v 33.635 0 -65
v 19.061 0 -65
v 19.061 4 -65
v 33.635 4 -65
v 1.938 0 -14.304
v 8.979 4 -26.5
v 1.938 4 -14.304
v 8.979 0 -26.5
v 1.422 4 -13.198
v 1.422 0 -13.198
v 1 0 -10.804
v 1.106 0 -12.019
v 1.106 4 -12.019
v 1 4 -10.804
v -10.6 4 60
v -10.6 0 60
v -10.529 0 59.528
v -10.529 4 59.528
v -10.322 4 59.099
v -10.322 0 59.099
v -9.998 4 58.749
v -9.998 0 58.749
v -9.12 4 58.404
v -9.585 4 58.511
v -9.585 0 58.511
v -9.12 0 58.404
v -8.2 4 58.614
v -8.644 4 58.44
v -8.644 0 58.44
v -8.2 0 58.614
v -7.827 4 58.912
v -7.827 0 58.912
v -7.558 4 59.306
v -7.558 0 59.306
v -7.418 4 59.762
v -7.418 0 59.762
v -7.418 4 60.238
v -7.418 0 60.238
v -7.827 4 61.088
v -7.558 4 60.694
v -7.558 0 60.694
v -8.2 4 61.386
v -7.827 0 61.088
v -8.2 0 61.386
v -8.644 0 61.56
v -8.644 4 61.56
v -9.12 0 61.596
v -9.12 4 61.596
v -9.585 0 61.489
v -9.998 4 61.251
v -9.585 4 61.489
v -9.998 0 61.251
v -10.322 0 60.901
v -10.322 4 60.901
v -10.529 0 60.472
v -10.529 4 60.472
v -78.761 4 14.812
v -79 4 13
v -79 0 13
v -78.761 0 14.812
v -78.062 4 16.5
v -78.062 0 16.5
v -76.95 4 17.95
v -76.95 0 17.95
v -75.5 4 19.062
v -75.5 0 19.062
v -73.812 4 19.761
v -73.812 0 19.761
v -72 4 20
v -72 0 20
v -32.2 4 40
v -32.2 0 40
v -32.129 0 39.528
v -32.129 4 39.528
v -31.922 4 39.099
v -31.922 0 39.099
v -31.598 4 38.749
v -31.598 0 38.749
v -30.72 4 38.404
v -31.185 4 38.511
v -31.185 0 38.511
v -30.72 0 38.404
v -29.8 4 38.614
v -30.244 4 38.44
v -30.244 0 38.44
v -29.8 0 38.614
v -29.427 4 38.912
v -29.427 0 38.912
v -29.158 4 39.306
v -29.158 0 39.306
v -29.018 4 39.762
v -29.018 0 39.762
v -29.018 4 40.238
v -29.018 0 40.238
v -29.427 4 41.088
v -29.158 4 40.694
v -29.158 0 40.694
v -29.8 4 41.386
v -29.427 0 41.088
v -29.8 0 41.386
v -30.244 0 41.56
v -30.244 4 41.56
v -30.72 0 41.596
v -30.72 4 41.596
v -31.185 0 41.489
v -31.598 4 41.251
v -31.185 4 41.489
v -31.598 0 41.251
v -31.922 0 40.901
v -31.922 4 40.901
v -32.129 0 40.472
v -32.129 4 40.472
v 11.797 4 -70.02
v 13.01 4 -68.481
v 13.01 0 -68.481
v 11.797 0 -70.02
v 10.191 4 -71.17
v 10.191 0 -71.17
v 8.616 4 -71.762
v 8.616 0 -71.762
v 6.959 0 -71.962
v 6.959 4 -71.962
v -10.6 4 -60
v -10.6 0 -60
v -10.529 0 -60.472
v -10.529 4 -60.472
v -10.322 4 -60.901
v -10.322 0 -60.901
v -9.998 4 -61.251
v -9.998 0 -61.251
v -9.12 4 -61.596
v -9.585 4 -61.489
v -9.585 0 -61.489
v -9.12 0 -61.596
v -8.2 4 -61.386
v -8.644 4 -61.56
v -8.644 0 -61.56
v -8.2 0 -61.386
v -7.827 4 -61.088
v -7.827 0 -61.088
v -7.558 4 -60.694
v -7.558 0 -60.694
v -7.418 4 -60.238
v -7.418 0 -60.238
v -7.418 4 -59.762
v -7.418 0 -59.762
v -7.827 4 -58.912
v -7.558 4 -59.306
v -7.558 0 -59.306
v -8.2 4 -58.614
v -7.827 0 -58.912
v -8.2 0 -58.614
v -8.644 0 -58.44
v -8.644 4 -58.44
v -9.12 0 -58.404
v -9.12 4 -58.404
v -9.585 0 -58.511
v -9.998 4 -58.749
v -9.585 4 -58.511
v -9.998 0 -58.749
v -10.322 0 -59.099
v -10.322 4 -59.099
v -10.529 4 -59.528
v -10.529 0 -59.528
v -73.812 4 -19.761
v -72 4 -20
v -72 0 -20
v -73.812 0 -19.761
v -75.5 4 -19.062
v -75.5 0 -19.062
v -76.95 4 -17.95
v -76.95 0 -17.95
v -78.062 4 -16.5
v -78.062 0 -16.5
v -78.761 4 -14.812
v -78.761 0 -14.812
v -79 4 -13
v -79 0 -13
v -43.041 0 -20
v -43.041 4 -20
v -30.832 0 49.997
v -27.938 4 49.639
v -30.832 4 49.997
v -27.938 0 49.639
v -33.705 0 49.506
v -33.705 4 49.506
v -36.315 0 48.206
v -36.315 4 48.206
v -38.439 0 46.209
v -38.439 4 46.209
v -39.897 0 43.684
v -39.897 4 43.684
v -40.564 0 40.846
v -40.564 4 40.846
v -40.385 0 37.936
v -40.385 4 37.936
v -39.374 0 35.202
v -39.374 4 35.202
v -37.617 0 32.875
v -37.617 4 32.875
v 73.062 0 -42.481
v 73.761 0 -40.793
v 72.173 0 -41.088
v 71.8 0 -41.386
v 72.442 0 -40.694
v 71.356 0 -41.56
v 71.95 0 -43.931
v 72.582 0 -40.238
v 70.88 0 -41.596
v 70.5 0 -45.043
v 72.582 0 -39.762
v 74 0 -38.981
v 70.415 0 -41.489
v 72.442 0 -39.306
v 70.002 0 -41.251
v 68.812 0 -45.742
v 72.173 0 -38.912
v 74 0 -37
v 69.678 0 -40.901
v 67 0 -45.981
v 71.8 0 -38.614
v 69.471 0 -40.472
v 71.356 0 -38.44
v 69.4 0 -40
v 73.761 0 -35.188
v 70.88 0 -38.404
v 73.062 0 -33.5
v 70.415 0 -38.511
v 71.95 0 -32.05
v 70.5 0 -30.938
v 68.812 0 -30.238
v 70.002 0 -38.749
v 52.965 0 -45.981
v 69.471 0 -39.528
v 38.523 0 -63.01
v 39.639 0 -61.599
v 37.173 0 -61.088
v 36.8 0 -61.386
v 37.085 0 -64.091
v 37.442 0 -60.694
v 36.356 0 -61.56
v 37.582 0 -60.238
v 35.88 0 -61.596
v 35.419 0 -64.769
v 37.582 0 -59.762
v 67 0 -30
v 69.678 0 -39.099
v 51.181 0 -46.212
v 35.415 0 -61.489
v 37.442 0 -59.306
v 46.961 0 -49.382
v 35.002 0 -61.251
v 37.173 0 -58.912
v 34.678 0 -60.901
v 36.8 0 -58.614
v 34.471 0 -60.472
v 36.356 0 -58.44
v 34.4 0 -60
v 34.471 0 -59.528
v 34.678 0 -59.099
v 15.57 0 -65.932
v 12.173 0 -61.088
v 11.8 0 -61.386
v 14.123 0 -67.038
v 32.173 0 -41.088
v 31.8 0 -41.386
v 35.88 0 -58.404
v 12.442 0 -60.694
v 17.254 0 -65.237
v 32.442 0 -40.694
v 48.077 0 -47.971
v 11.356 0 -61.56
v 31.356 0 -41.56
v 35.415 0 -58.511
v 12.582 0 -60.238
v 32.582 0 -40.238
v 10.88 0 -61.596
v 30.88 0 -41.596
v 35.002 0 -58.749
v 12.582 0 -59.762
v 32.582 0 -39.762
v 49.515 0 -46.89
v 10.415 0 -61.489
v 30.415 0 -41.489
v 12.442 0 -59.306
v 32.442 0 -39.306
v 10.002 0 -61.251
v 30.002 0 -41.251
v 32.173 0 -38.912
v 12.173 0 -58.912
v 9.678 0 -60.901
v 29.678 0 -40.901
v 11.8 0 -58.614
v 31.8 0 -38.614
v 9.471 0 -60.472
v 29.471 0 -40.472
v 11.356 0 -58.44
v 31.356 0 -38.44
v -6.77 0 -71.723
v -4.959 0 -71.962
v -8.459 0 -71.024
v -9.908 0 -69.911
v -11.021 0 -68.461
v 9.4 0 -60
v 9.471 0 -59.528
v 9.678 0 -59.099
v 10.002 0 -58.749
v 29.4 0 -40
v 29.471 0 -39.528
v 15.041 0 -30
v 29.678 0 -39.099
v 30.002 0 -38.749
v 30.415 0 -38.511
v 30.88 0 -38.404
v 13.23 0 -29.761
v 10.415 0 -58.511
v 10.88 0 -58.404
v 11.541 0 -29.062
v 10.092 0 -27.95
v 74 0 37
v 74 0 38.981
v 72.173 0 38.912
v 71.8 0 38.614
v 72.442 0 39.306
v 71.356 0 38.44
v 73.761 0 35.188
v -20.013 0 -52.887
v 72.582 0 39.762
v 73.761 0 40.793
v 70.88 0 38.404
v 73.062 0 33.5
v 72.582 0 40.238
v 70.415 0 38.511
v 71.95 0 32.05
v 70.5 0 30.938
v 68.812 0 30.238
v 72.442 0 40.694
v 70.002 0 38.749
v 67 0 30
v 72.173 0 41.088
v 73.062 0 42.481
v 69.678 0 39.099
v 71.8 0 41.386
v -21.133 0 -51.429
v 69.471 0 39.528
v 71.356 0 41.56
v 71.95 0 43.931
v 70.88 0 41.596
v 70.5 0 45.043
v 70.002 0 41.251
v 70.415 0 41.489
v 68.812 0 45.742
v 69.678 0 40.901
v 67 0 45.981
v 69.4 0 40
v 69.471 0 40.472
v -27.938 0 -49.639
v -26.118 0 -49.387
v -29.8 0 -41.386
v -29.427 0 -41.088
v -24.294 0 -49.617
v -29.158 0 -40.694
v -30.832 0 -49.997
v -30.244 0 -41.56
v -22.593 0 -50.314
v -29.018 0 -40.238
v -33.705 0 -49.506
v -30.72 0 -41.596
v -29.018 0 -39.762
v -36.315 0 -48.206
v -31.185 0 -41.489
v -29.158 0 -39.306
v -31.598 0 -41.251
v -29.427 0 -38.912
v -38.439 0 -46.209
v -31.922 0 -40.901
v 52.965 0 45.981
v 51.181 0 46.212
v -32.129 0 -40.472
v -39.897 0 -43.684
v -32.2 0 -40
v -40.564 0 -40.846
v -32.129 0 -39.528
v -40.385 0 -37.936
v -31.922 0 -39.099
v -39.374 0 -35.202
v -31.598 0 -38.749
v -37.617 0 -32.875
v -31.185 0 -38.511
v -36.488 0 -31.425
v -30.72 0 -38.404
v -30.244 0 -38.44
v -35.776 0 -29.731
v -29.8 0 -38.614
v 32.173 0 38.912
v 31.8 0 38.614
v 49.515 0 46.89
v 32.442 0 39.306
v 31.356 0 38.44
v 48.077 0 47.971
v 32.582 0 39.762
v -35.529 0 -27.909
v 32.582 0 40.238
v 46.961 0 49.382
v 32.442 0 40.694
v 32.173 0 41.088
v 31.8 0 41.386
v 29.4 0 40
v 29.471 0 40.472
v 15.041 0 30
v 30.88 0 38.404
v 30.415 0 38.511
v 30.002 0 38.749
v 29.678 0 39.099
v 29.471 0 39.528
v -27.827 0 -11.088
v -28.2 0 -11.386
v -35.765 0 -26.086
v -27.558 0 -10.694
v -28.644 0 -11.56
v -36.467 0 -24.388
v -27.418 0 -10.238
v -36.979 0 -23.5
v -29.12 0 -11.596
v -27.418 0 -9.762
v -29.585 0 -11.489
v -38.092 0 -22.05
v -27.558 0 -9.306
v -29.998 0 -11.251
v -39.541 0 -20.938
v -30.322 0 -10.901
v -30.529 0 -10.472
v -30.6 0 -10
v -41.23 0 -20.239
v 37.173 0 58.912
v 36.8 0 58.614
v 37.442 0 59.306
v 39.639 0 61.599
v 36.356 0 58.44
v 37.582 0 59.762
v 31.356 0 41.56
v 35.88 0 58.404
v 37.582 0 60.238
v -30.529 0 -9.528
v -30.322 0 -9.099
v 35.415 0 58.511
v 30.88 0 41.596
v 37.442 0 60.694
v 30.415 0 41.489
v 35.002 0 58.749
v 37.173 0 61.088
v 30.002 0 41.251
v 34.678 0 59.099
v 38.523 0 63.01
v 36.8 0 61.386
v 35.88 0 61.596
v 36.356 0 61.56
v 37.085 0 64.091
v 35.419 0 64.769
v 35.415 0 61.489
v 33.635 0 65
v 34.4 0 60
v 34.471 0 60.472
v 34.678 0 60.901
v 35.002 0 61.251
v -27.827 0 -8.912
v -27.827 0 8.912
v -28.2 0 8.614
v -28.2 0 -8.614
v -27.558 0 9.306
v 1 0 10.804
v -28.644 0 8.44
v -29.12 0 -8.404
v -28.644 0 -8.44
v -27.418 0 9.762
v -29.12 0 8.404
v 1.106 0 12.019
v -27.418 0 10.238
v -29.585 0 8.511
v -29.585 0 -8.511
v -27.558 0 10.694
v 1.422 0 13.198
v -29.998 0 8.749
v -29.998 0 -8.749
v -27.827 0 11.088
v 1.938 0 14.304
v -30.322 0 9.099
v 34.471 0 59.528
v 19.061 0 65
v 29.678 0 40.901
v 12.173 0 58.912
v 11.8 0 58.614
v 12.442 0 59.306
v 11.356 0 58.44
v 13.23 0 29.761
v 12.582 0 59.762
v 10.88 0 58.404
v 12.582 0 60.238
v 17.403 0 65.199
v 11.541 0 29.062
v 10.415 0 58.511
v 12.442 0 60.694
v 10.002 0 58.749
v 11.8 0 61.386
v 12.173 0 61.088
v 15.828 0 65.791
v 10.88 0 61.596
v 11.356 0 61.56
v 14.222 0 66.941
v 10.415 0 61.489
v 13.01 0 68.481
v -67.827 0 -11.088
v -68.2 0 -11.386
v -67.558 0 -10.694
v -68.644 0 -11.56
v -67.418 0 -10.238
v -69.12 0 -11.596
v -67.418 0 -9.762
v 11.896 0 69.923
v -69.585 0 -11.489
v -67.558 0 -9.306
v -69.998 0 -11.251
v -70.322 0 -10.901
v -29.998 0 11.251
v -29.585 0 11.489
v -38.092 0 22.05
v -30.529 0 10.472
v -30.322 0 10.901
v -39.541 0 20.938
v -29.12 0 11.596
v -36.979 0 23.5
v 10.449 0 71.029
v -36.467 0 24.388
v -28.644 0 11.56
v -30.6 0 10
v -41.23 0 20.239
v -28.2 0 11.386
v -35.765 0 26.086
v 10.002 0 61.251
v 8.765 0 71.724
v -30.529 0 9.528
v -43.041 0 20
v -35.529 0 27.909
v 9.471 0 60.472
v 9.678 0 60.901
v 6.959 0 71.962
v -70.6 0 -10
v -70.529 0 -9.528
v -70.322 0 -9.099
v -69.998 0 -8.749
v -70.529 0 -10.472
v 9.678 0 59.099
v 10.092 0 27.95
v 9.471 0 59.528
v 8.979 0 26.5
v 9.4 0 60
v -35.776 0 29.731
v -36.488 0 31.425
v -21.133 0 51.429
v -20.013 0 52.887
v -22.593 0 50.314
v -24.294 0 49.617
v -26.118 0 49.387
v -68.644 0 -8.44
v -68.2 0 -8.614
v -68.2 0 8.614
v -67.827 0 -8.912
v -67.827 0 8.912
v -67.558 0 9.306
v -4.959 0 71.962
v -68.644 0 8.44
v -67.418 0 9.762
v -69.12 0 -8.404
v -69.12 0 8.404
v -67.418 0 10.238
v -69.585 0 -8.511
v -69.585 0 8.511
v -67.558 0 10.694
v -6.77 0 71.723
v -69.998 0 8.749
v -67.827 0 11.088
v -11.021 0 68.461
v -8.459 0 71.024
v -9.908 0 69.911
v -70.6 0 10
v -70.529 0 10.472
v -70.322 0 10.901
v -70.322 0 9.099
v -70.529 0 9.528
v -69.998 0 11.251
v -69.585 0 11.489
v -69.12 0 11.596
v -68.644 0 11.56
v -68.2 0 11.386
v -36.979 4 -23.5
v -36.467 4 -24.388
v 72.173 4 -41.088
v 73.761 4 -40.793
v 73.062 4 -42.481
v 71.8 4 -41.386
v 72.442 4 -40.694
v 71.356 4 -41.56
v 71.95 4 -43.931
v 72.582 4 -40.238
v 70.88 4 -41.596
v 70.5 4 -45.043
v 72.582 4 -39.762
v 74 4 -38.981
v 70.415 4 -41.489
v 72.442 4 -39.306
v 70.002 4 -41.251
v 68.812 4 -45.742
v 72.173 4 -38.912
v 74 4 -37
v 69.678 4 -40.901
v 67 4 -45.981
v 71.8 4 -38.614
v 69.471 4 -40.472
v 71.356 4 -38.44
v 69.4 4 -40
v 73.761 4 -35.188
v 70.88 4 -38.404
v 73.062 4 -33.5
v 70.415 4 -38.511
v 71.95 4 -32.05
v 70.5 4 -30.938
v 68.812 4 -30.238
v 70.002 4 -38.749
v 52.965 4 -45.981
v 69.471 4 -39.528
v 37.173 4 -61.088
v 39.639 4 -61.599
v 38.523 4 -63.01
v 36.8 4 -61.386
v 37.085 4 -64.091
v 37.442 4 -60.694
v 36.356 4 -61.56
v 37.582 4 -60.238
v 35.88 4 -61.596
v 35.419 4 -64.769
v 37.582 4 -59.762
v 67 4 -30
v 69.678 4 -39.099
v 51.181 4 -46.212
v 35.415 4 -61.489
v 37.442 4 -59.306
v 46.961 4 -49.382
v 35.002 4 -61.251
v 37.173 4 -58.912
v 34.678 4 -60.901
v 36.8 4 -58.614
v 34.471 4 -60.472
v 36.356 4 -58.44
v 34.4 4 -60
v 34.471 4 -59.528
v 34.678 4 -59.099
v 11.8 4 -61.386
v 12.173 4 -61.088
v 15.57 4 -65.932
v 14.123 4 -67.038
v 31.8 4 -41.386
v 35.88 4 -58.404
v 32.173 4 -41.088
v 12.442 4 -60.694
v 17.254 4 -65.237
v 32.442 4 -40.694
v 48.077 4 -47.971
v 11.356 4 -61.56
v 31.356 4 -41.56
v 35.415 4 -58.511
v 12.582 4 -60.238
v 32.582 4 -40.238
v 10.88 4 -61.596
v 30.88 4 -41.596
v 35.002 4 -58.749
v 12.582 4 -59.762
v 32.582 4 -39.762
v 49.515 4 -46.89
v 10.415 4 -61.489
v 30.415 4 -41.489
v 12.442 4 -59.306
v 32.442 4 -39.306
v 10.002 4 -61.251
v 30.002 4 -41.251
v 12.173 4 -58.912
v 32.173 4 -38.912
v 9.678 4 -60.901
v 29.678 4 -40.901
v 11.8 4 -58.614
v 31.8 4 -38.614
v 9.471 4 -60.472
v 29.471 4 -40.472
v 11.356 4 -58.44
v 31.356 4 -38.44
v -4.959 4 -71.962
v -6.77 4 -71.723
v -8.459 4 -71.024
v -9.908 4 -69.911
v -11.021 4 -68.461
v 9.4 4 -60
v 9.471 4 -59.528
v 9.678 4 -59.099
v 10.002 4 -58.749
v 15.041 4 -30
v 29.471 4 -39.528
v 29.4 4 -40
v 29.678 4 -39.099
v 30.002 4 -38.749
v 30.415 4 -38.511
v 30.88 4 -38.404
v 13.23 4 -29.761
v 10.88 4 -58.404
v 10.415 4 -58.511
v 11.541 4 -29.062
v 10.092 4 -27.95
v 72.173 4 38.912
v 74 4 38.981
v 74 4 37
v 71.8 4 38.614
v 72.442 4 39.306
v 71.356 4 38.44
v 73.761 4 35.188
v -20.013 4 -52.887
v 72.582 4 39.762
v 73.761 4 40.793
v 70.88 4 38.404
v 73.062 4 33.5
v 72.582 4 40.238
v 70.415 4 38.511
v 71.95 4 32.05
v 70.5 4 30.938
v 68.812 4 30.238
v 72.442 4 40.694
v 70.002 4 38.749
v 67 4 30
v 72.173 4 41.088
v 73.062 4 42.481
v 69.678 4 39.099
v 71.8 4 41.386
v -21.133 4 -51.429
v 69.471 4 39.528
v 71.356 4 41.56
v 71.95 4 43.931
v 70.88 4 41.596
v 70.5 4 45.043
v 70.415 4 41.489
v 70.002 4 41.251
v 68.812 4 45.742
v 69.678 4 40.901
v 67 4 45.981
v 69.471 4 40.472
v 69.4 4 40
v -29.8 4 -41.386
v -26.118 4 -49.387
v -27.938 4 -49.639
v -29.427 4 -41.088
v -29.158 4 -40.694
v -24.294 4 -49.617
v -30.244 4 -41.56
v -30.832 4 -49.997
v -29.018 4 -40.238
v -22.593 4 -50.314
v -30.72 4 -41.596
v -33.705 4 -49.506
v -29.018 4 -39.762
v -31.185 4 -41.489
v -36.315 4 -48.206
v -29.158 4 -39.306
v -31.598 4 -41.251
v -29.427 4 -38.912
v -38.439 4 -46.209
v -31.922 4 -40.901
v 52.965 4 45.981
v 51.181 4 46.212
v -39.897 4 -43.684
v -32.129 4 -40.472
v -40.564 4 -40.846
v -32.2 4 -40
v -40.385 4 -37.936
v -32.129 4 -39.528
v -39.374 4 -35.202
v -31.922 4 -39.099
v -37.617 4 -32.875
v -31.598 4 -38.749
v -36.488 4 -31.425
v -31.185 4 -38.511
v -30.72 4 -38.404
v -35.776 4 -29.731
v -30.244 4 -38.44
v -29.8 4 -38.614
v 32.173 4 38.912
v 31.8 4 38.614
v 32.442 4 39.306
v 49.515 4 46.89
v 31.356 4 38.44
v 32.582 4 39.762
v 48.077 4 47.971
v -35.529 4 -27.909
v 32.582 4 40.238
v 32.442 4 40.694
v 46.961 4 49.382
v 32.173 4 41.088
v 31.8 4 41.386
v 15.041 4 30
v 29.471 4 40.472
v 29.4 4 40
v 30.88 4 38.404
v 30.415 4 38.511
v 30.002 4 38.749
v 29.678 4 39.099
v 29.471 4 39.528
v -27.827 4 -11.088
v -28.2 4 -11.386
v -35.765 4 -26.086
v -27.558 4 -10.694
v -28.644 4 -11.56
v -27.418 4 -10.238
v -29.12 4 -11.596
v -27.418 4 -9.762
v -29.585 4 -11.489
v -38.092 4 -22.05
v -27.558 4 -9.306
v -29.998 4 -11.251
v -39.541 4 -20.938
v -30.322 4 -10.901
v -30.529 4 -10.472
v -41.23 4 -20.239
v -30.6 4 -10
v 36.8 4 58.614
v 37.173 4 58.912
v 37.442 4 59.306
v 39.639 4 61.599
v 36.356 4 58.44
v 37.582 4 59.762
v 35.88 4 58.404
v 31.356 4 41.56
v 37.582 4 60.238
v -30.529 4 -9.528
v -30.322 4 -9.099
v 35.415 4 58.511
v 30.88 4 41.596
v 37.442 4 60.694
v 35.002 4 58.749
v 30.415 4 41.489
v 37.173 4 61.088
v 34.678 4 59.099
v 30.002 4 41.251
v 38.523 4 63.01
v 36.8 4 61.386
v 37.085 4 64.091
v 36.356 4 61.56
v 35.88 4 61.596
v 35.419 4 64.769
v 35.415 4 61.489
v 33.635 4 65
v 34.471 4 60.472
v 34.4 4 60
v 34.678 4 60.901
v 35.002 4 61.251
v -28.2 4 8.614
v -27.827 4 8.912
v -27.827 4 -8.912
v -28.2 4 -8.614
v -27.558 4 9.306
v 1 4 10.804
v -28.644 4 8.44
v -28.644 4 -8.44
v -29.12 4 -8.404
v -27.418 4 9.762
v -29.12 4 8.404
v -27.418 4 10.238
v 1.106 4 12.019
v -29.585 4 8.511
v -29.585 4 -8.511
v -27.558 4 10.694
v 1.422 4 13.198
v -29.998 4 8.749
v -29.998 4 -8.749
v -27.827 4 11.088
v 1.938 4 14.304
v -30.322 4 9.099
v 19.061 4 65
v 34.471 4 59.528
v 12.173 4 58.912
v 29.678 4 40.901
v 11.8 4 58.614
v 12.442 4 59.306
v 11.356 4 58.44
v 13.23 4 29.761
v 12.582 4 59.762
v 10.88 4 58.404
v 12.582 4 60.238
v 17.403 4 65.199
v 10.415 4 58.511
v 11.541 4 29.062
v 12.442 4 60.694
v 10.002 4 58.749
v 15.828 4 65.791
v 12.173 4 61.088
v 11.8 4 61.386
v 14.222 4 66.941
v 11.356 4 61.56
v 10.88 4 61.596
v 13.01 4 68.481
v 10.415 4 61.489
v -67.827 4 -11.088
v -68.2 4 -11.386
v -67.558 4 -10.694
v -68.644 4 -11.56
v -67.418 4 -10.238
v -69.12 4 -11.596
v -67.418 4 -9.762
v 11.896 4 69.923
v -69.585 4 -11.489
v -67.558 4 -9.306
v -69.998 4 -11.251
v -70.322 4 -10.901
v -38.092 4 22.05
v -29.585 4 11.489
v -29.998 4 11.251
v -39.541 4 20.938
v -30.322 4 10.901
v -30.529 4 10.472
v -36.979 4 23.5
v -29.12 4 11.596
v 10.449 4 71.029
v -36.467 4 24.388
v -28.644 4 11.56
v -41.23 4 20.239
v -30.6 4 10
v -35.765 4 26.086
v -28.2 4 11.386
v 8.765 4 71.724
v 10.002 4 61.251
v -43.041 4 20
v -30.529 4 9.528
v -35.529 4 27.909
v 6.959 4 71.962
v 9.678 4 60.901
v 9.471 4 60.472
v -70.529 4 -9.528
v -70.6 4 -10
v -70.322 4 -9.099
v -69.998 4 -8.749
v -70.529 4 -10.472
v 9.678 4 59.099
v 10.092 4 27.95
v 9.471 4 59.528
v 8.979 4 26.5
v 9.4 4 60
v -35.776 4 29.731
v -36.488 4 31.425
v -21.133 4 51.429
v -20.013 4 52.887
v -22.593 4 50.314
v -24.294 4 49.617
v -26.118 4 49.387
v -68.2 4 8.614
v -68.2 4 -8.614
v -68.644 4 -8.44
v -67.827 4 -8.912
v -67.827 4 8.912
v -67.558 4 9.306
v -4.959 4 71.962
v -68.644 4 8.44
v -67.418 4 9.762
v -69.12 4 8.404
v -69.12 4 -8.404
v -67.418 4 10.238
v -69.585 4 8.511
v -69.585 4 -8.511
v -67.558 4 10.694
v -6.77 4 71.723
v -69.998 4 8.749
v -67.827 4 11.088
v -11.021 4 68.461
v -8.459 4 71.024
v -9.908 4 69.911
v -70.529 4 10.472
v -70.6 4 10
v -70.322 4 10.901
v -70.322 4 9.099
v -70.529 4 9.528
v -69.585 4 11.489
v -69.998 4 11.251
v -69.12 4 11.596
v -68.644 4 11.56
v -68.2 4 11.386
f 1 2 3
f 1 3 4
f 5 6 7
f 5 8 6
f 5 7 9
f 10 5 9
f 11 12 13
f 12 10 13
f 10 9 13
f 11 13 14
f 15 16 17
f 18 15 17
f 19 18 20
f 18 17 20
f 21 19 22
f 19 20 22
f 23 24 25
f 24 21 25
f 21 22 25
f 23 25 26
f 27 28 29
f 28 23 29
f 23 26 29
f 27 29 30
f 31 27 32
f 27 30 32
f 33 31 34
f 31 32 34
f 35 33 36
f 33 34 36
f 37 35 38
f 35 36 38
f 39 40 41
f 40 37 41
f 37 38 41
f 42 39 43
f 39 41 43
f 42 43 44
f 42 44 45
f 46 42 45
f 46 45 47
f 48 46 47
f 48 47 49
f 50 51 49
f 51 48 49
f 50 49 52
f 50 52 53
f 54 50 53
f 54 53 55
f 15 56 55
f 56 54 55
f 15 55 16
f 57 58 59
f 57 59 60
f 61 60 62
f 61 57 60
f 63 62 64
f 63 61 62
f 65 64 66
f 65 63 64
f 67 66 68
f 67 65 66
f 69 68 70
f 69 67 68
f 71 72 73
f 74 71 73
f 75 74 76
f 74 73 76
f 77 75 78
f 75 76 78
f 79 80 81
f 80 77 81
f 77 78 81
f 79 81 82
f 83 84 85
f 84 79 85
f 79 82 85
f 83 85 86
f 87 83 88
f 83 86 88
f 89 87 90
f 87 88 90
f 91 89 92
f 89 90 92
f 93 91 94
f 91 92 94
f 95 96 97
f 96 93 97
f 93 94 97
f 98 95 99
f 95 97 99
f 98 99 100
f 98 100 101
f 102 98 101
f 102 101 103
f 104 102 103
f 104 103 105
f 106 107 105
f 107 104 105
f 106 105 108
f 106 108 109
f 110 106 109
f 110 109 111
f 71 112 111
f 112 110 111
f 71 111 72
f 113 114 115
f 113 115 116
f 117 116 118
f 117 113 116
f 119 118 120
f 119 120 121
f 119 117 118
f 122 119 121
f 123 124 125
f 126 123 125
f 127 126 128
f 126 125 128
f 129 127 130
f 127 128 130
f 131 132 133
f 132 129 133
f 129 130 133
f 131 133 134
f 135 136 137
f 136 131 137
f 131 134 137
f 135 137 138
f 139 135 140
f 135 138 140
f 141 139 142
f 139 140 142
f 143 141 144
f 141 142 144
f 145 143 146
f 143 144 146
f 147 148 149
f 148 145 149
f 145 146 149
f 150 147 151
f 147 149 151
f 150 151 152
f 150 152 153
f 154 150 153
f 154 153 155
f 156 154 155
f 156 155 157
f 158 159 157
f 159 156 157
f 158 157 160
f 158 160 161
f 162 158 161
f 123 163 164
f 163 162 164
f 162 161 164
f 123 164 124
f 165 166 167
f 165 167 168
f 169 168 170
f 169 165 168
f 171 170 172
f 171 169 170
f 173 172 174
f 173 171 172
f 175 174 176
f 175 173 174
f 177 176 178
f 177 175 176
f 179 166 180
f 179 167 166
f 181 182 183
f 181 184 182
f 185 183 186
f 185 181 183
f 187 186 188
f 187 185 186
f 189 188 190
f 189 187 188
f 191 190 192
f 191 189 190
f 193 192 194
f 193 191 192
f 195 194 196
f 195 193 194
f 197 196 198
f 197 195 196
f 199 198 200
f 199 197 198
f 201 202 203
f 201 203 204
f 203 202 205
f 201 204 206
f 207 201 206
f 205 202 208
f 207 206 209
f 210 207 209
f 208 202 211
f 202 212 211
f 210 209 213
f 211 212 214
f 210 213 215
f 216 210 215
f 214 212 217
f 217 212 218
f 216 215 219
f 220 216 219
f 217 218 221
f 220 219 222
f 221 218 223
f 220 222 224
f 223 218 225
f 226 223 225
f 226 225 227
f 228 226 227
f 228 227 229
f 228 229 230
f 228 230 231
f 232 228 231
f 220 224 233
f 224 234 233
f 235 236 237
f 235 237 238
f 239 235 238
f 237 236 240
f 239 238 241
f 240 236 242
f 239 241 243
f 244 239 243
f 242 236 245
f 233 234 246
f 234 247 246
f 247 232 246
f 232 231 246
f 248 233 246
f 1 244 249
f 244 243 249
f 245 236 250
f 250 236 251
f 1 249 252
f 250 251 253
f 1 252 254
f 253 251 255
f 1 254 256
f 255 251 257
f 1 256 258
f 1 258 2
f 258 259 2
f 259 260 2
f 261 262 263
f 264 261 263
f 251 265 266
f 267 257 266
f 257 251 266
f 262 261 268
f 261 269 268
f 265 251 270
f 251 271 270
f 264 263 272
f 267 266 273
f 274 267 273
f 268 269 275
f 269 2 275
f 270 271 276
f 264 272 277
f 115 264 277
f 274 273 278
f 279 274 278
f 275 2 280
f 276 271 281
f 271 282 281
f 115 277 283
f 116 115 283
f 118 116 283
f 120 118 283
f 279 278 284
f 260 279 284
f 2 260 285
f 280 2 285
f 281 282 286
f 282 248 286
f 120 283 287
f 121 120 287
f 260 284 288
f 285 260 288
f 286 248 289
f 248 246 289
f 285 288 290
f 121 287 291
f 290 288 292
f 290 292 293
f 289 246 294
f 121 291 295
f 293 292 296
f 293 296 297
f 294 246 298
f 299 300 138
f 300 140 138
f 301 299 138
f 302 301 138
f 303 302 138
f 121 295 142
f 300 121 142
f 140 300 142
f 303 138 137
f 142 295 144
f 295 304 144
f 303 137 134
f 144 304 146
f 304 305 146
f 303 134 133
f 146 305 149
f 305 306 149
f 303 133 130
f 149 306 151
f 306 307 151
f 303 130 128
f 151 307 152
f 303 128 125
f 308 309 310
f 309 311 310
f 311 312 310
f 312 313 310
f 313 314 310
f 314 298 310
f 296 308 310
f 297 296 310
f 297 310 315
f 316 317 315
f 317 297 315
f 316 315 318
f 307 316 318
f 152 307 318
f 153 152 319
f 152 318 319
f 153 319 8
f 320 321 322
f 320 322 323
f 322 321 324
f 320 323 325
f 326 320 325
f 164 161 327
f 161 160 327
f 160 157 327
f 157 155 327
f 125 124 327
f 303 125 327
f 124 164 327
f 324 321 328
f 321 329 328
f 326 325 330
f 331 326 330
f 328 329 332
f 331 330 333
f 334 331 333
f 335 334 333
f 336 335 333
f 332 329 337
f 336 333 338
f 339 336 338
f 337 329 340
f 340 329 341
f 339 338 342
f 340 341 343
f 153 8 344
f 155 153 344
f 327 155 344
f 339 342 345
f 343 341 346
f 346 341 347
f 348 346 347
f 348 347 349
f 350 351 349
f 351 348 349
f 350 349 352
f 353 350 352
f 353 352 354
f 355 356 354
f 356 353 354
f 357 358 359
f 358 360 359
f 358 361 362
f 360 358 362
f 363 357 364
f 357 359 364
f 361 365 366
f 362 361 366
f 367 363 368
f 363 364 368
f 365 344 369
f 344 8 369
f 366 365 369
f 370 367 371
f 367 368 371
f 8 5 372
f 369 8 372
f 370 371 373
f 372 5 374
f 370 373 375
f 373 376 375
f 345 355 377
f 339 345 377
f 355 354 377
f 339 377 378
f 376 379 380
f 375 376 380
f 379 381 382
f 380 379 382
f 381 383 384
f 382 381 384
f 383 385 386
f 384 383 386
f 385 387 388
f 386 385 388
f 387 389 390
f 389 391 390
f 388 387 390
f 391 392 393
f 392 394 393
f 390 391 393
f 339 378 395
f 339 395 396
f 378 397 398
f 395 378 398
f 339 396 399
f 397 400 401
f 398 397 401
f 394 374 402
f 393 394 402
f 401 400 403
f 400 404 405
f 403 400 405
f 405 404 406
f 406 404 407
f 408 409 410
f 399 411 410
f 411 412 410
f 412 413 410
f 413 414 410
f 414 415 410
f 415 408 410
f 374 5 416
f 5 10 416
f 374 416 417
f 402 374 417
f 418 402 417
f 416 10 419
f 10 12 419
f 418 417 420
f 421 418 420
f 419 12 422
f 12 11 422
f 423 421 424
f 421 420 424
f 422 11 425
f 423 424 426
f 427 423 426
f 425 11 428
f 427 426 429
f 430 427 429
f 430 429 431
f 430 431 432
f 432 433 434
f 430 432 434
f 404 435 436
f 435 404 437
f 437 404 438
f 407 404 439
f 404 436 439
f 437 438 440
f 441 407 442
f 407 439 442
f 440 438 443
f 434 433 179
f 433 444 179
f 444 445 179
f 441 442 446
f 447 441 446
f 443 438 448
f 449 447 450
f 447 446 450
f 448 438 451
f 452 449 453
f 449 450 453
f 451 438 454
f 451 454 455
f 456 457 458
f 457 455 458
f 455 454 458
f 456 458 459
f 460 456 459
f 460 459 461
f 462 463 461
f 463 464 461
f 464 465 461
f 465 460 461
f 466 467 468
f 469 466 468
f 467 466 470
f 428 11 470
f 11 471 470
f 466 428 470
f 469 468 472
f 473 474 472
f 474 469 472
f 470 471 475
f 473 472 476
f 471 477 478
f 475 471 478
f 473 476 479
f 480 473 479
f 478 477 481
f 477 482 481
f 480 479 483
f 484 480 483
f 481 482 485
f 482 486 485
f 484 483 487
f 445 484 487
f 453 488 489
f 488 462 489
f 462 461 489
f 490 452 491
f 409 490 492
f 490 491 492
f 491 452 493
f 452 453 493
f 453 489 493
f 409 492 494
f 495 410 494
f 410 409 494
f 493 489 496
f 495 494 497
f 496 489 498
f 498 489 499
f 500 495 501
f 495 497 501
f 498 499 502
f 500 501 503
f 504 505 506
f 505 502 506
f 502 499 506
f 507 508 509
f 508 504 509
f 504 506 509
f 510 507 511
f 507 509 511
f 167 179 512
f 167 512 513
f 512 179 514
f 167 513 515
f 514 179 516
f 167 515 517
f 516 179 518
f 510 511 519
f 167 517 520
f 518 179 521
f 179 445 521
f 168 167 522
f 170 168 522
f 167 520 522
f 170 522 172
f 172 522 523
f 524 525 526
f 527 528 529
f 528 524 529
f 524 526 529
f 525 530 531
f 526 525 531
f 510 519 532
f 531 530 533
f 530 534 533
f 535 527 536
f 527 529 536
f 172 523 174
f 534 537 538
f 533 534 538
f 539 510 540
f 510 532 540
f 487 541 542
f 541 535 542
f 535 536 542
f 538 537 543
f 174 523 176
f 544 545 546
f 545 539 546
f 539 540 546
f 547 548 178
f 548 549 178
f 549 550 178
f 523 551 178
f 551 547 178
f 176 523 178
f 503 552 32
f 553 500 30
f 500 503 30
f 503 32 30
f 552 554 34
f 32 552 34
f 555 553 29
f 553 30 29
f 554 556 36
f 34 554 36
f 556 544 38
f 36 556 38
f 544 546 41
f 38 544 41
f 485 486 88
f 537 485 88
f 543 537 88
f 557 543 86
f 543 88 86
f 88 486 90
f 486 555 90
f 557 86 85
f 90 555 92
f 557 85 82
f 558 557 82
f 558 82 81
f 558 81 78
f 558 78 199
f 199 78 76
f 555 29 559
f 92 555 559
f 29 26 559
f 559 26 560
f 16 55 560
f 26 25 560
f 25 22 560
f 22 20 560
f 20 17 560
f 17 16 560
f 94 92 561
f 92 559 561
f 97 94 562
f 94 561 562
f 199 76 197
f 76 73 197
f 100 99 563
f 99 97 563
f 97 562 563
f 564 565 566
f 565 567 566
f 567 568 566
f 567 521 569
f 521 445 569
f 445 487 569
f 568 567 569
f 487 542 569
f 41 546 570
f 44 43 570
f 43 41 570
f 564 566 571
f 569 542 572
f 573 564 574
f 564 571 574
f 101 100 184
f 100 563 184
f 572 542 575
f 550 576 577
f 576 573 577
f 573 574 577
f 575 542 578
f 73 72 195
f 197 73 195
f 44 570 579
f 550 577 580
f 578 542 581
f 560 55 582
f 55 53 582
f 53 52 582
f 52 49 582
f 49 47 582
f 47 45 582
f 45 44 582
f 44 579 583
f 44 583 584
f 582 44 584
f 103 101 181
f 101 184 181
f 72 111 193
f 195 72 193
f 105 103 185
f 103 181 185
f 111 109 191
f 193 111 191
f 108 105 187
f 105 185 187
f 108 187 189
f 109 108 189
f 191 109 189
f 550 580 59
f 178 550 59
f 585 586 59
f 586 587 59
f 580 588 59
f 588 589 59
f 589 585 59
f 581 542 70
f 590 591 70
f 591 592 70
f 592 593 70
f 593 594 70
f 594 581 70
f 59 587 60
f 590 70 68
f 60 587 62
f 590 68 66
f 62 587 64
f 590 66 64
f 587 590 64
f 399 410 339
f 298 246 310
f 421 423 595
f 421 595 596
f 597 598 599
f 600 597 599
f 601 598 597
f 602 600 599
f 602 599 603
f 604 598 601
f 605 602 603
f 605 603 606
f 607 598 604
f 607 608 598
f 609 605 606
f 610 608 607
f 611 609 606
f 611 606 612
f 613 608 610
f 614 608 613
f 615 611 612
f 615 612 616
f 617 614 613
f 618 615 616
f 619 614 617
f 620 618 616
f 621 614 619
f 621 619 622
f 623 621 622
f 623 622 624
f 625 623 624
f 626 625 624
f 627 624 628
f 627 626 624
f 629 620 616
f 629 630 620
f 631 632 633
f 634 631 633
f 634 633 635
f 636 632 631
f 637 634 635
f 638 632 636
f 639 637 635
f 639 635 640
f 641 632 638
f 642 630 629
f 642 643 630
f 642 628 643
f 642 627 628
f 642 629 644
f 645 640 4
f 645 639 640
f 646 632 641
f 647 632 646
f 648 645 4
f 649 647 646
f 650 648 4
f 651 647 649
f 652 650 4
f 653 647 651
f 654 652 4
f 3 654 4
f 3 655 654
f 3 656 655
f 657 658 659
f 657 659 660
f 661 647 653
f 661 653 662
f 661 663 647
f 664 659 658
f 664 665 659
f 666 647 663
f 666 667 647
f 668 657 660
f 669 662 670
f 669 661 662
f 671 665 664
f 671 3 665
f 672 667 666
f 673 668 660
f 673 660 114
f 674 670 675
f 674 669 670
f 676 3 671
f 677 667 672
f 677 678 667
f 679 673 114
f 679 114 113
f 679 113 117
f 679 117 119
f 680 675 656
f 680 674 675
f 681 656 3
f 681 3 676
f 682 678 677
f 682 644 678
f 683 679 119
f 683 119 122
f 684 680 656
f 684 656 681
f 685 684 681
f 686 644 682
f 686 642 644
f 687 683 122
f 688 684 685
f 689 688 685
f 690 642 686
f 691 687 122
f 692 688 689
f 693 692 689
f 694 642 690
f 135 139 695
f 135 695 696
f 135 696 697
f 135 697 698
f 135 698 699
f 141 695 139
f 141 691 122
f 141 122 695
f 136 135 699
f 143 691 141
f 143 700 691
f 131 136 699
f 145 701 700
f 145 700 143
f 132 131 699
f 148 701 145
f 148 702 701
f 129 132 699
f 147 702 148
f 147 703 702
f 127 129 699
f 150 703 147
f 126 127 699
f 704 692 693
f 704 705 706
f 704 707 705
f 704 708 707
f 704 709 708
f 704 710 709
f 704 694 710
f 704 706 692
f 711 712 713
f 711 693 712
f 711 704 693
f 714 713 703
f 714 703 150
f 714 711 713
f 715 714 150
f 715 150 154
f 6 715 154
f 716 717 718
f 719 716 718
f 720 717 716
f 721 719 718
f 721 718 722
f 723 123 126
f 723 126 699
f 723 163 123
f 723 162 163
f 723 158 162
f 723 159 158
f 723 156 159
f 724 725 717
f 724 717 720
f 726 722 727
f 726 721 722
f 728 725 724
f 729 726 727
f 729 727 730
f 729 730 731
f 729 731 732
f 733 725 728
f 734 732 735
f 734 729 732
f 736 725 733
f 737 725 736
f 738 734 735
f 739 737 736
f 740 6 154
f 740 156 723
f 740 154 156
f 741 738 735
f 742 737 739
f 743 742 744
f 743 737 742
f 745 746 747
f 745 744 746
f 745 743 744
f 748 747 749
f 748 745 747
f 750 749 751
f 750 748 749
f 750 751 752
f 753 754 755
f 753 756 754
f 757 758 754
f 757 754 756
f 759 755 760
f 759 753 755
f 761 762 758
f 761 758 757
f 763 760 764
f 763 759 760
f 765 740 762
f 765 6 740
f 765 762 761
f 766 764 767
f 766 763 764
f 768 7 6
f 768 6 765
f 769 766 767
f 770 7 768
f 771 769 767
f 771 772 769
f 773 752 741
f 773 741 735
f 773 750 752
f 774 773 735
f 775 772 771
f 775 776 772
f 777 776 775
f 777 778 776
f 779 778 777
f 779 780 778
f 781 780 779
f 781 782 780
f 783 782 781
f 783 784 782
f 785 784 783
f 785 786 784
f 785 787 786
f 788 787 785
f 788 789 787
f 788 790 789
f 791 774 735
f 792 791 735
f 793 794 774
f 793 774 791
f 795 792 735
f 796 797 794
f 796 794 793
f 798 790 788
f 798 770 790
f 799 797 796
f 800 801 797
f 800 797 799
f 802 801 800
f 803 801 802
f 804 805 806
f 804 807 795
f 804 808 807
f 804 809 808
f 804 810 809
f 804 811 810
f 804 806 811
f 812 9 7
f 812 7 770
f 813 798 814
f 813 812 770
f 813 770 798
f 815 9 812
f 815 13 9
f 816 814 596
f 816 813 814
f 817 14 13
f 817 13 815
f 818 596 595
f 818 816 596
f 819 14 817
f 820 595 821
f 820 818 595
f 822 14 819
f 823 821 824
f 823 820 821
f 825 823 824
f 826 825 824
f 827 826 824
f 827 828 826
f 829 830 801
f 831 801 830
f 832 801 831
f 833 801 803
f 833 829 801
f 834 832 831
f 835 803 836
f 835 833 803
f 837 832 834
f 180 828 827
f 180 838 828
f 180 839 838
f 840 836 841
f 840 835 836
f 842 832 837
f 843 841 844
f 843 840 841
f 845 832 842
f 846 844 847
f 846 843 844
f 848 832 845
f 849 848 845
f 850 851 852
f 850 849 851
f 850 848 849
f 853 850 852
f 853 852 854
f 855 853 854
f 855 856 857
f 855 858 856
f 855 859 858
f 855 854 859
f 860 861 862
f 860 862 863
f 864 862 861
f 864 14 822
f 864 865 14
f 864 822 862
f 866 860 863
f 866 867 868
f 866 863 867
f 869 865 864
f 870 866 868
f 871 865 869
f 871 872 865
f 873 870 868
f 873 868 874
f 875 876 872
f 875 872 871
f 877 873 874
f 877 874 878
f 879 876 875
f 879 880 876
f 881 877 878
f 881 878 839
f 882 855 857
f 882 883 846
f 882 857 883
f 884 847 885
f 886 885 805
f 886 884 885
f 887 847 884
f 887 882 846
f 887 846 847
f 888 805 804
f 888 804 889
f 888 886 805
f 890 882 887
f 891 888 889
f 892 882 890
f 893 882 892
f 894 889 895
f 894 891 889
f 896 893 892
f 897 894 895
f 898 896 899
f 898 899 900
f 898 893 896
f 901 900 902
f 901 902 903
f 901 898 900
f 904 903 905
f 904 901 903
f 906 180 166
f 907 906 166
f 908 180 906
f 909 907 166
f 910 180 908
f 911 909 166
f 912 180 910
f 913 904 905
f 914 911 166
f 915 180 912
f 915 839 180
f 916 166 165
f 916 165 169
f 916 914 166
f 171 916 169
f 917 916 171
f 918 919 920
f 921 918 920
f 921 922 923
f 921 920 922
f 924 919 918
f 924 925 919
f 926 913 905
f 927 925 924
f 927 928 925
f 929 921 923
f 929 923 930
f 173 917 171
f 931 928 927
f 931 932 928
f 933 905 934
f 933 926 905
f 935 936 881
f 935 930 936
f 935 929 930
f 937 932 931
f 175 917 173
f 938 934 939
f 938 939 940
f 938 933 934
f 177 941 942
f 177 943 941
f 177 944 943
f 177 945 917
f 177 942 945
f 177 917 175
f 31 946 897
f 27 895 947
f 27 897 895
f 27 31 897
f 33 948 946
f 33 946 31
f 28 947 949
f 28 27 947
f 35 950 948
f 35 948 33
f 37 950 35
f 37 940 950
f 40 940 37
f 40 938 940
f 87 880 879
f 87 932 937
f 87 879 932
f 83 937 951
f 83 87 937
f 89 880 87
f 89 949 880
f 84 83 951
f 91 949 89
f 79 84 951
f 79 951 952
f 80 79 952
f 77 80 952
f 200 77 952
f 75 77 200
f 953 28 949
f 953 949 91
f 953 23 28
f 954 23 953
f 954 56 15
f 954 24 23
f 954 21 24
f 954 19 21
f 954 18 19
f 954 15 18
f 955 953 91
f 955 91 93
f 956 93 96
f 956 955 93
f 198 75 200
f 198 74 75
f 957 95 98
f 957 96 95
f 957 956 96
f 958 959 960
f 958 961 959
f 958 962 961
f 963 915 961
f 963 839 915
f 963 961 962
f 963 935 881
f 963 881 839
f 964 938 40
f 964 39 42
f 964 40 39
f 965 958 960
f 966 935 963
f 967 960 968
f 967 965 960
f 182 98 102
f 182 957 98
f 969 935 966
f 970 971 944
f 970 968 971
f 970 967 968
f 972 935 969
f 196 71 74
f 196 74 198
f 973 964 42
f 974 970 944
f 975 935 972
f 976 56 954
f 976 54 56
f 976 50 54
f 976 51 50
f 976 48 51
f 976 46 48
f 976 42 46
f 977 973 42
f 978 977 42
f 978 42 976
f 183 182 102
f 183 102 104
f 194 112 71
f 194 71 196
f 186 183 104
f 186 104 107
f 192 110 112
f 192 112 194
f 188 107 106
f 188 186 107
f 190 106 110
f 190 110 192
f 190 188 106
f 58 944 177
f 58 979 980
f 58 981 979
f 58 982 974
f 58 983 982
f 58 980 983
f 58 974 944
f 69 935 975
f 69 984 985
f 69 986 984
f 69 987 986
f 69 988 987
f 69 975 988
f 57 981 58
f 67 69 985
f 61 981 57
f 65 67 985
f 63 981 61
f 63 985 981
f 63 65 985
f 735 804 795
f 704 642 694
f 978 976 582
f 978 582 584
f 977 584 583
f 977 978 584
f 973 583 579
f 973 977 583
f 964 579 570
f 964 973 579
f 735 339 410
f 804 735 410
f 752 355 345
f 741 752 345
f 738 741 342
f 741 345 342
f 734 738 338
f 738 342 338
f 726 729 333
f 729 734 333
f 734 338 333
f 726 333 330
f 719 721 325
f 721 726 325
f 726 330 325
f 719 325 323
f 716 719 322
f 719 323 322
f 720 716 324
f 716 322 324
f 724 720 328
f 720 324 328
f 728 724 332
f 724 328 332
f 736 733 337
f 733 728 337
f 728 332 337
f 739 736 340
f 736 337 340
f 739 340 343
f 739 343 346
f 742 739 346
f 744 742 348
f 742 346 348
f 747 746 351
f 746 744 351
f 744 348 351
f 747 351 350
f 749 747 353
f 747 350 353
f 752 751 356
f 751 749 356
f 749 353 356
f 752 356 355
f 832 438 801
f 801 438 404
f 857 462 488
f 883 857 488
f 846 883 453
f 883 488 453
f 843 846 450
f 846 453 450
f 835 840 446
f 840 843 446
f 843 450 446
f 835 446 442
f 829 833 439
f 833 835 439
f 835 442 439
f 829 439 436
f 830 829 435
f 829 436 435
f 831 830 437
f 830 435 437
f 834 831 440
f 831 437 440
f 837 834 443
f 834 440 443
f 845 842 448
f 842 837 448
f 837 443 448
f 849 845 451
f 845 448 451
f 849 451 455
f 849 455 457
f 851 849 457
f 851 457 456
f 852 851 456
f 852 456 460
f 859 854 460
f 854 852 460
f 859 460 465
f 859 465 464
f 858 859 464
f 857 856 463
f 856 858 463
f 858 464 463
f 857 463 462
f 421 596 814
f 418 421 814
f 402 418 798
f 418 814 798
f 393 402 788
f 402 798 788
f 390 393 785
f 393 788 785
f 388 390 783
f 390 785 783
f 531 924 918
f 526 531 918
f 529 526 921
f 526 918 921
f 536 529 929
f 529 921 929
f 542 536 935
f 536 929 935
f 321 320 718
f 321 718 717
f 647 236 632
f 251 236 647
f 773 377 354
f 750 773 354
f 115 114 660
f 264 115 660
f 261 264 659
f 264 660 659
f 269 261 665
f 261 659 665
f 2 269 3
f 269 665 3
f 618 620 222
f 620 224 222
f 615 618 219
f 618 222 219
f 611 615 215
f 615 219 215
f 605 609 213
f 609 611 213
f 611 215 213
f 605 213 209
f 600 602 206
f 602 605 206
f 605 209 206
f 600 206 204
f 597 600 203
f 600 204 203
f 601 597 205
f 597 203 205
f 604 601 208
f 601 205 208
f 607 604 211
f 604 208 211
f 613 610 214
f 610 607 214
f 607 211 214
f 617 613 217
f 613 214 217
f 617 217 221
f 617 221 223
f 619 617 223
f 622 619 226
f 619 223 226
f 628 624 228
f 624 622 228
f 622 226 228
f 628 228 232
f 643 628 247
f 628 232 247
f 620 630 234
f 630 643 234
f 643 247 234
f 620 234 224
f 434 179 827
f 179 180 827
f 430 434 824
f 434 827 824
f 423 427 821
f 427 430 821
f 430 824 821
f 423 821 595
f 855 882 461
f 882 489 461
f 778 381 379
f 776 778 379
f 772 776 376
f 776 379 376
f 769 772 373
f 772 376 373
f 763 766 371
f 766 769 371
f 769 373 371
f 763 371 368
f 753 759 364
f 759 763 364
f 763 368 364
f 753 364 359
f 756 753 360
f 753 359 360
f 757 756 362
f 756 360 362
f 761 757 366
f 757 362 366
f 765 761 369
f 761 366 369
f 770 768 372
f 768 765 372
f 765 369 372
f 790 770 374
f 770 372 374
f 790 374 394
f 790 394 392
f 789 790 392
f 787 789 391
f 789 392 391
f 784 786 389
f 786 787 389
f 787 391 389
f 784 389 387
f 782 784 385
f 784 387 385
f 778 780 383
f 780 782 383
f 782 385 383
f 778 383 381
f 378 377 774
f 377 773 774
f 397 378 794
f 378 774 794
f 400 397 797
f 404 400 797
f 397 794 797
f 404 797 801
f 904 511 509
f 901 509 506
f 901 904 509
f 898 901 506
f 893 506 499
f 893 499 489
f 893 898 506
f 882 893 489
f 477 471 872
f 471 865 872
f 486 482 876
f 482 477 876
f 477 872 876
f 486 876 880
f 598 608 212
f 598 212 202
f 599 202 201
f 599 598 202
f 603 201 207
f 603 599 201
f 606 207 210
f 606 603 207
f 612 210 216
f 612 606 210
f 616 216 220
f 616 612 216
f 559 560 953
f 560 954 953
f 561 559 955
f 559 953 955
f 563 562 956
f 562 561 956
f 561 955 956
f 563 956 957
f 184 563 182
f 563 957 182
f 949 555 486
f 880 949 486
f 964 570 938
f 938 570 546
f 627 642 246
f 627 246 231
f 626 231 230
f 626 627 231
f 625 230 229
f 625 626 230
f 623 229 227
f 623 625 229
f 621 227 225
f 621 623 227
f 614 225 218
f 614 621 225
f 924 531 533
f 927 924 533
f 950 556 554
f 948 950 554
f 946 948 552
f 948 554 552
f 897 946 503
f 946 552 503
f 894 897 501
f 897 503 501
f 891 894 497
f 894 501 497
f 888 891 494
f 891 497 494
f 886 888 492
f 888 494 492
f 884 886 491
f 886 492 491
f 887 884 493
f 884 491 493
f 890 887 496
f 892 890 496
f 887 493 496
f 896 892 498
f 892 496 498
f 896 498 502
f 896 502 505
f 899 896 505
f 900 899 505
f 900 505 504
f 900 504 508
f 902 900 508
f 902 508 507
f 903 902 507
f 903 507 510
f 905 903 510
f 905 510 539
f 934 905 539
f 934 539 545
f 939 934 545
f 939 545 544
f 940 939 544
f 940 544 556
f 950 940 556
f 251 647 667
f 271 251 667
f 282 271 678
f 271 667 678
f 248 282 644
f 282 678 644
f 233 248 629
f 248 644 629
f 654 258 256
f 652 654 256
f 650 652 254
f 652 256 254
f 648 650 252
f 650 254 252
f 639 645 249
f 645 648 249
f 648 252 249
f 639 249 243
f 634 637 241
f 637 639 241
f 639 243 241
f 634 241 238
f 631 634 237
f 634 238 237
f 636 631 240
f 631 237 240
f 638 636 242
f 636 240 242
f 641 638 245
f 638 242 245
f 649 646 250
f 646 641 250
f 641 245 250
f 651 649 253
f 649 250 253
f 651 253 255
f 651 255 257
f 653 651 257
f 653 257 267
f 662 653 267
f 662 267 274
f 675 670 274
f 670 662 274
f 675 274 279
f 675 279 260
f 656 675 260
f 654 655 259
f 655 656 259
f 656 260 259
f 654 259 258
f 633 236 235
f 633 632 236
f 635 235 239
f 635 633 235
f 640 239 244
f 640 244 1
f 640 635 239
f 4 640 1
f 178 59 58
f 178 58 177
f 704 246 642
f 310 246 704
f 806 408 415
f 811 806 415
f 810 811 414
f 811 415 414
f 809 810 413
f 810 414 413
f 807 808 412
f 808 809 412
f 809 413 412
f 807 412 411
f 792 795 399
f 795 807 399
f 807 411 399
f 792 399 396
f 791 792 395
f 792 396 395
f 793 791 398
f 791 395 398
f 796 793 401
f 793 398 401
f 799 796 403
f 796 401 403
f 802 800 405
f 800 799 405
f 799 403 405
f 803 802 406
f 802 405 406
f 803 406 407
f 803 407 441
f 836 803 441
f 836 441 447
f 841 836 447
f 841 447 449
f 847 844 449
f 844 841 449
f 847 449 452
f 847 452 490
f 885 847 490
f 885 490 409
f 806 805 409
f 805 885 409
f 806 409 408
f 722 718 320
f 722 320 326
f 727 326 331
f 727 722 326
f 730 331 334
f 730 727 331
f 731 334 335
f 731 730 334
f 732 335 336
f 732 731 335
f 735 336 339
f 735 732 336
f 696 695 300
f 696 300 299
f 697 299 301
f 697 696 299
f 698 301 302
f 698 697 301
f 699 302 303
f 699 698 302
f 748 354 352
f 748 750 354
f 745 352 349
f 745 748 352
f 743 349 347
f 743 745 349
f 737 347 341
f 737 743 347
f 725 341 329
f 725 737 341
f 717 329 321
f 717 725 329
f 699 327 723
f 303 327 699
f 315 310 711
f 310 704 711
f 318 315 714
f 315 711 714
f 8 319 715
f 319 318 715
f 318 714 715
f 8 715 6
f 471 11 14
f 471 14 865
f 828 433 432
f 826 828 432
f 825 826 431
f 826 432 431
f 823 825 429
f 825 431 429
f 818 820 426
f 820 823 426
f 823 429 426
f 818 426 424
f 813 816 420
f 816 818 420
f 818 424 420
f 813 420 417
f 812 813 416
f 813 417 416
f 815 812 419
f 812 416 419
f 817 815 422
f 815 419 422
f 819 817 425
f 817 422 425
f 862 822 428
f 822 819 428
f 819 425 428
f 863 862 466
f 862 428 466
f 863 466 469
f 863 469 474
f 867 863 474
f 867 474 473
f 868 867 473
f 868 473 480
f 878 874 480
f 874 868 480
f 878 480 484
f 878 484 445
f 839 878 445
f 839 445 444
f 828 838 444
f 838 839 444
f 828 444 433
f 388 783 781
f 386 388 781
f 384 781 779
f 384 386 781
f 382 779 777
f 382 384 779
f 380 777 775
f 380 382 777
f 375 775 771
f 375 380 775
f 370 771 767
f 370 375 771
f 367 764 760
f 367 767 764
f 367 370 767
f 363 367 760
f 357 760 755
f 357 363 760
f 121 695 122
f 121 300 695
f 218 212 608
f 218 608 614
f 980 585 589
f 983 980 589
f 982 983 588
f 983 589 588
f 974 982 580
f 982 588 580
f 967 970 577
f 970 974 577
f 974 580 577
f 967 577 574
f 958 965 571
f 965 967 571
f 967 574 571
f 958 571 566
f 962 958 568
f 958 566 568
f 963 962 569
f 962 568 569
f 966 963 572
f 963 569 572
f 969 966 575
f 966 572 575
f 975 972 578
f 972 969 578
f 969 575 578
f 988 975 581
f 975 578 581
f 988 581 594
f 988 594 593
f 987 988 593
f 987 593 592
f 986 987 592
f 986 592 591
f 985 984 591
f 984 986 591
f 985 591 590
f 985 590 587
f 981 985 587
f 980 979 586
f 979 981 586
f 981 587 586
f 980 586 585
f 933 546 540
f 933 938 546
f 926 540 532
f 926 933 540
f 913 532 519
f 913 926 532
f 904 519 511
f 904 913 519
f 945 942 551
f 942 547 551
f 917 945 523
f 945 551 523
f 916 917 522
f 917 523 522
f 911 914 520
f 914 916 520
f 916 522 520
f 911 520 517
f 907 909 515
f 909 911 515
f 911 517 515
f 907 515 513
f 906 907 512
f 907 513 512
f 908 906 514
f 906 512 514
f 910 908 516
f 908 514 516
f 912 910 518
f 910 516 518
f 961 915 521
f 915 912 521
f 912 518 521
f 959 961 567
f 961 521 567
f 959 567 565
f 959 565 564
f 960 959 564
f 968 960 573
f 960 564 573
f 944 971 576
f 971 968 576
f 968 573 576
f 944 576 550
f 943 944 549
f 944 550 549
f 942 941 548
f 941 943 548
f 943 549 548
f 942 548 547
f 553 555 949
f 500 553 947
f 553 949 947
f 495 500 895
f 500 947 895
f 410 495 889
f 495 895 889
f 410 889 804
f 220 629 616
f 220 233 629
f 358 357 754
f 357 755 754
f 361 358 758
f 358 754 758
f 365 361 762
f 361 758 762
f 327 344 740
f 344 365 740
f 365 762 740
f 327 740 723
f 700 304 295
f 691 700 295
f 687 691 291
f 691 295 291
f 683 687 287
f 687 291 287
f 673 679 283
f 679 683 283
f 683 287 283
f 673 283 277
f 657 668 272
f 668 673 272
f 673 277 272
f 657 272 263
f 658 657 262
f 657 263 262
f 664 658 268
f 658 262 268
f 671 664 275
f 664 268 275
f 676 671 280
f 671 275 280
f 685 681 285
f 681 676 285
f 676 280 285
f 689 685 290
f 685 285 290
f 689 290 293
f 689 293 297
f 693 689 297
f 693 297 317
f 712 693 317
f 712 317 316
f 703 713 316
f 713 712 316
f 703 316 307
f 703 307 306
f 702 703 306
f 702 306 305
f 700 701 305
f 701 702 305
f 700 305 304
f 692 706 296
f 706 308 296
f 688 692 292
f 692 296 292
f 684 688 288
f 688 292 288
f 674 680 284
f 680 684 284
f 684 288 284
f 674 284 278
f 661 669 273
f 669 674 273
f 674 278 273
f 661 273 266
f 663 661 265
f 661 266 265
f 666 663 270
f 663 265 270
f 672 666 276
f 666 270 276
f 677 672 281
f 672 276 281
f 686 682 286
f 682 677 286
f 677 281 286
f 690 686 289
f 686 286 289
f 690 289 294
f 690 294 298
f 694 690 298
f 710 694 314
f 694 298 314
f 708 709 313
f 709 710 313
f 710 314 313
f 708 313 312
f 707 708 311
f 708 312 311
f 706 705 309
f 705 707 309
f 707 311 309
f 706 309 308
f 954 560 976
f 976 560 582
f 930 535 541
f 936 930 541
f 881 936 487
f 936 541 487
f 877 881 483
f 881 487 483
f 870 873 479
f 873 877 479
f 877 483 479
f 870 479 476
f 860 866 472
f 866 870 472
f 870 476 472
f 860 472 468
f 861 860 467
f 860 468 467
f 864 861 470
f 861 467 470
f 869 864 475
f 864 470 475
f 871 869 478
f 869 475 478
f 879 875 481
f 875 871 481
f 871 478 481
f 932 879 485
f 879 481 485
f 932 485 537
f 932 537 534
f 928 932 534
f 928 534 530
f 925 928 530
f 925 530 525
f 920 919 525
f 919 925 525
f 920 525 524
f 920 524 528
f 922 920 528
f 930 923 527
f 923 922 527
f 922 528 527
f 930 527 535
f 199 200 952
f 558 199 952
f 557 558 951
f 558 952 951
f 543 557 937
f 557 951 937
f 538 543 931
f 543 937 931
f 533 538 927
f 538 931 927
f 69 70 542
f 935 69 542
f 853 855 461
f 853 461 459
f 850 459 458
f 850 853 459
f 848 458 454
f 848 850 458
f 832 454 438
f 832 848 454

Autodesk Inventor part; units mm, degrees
ref_plane "YZ Plane" through (0, 0, 0) normal (1, 0, 0) x (0, 1, 0)
ref_plane "XZ Plane" through (0, 0, 0) normal (0, 1, 0) x (-1, 0, 0)
ref_plane "XY Plane" through (0, 0, 0) normal (0, 0, 1) x (1, 0, 0)
sketch "Sketch1" plane through (0, 0, 0) normal (0, 1, 0) x (-1, 0, 0)
  line L0 (121, 0) -> (-97, 0) construction
  circle A0 centre (29, -10) radius 1.6
  circle A1 centre (69, -10) radius 1.6
  circle A2 centre (9, -60) radius 1.6
  circle A3 centre (-11, -60) radius 1.6
  line L1 (79, 0) -> (79, -20)
  line L2 (79, -20) -> (39, -20)
  line L3 (9, -71.9615) -> (-11, -71.9615)
  circle A4 centre (-31, -40) radius 1.6
  line L4 (-11, -71.9615) -> (-15.0192, -65)
  line L5 (-11, -71.9615) -> (19, -71.9615) construction
  circle A5 centre (-71, -40) radius 1.6
  line L6 (-49, -45.9808) -> (-81, -45.9808)
  line L7 (-81, -45.9808) -> (-81, -29.9998)
  line L8 (-81, -29.9998) -> (-11, -29.9998)
  line L9 (-11, -29.9998) -> (-1, -12.6793)
  line L10 (-1, -12.6793) -> (-1, 0)
  circle A6 centre (29, 10) radius 1.6
  circle A7 centre (69, 10) radius 1.6
  circle A8 centre (9, 60) radius 1.6
  circle A9 centre (-11, 60) radius 1.6
  line L11 (79, 0) -> (79, 20)
  line L12 (79, 20) -> (39, 20)
  line L13 (9, 71.9615) -> (-11, 71.9615)
  circle A10 centre (-31, 40) radius 1.6
  line L14 (-11, 71.9615) -> (-15.0192, 65)
  line L15 (-11, 71.9615) -> (19, 71.9615) construction
  circle A11 centre (-71, 40) radius 1.6
  line L16 (-49, 45.9808) -> (-81, 45.9808)
  line L17 (-81, 45.9808) -> (-81, 29.9998)
  line L18 (-81, 29.9998) -> (-11, 29.9998)
  line L19 (-11, 29.9998) -> (-1, 12.6793)
  line L20 (-1, 12.6793) -> (-1, 0)
  line L21 (-81, -45.9808) -> (-74, -45.9808)
  line L22 (-74, -45.9808) -> (-74, -29.9998)
  line L23 (-74, 29.9998) -> (-74, 45.9808)
  circle A12 centre (30.6, 40) radius 1.6
  arc A13 (33.0505, 30.3049) -> (23.429, 46.9697) centre (30.6, 40) ccw
  circle A14 centre (30.6, -40) radius 1.6
  arc A15 (23.429, -46.9697) -> (33.0505, -30.3049) centre (30.6, -40) ccw
  line L24 (39, 20) -> (33.0505, 30.3049)
  line L25 (23.429, 46.9697) -> (9, 71.9615)
  line L26 (39, -20) -> (33.0505, -30.3049)
  line L27 (23.429, -46.9697) -> (9, -71.9615)
  circle A16 centre (-36, 60) radius 1.6
  line L28 (-11, 60) -> (-11, 61.6)
  line L29 (-15.0192, 65) -> (-37.6, 65)
  line L30 (-37.6, 65) -> (-49, 45.9808)
  circle A17 centre (-36, -60) radius 1.6
  line L31 (-15.0192, -65) -> (-37.6, -65)
  line L32 (-37.6, -65) -> (-49, -45.9808)
  point P0 (0, 0)
  point P1 (-26, -45.9808)
  point P2 (-26, 45.9808)
  dimension "d0" = 3.2
  dimension "d3" = 3.2
  dimension "d5" = 3.2
  dimension "d6" = 50
  dimension "d15" = 20
  dimension "d16" = 40
  dimension "d18" = 20
  dimension "d25" = 3.2
  dimension "d27" = 40
  dimension "d28" = 120
  dimension "d29" = 3.2
  dimension "d30" = 40
  dimension "d31" = 55
  dimension "d32" = 15.981
  dimension "d33" = 120
  dimension "d36" = 3.2
  dimension "d37" = 30
  dimension "d38" = 20
  dimension "d39" = 3.2
  dimension "d40" = 25
extrude "Extrusion1" add sketch "Sketch1" along normal blind 4
sketch "Sketch2" plane through (0, 4, 0) normal (0, 1, 0) x (1, 0, 0)
  point P0 (0, 0)
extrude "Extrusion2" cut sketch "Sketch1" along normal blind 4 contours L6 L7 L8 L22 | L23 L18 L17 L16
fillet "Fillet1" radius 7 26 edges at (49, 2, 45.9808) (37.6, 2, 65) (74, 2, 45.9808) (74, 2, 29.9998) (1, 2, 12.6793) (1, 2, -12.6793) (11, 2, -29.9998) (11, 2, 29.9998) (74, 2, -29.9998) (49, 2, -45.9808) (74, 2, -45.9808) (37.6, 2, -65) (15.0192, 2, -65) (11, 2, -71.9615) (-9, 2, -71.9615) (-23.429, 2, -46.9697) (-33.0505, 2, -30.3049) (-39, 2, -20) (-79, 2, -20) (-79, 2, 20) (-33.0505, 2, 30.3049) (-39, 2, 20) (-23.429, 2, 46.9697) (-9, 2, 71.9615) (11, 2, 71.9615) (15.0192, 2, 65)
properties part number "Fix Konektor Casis_3DPrint"
